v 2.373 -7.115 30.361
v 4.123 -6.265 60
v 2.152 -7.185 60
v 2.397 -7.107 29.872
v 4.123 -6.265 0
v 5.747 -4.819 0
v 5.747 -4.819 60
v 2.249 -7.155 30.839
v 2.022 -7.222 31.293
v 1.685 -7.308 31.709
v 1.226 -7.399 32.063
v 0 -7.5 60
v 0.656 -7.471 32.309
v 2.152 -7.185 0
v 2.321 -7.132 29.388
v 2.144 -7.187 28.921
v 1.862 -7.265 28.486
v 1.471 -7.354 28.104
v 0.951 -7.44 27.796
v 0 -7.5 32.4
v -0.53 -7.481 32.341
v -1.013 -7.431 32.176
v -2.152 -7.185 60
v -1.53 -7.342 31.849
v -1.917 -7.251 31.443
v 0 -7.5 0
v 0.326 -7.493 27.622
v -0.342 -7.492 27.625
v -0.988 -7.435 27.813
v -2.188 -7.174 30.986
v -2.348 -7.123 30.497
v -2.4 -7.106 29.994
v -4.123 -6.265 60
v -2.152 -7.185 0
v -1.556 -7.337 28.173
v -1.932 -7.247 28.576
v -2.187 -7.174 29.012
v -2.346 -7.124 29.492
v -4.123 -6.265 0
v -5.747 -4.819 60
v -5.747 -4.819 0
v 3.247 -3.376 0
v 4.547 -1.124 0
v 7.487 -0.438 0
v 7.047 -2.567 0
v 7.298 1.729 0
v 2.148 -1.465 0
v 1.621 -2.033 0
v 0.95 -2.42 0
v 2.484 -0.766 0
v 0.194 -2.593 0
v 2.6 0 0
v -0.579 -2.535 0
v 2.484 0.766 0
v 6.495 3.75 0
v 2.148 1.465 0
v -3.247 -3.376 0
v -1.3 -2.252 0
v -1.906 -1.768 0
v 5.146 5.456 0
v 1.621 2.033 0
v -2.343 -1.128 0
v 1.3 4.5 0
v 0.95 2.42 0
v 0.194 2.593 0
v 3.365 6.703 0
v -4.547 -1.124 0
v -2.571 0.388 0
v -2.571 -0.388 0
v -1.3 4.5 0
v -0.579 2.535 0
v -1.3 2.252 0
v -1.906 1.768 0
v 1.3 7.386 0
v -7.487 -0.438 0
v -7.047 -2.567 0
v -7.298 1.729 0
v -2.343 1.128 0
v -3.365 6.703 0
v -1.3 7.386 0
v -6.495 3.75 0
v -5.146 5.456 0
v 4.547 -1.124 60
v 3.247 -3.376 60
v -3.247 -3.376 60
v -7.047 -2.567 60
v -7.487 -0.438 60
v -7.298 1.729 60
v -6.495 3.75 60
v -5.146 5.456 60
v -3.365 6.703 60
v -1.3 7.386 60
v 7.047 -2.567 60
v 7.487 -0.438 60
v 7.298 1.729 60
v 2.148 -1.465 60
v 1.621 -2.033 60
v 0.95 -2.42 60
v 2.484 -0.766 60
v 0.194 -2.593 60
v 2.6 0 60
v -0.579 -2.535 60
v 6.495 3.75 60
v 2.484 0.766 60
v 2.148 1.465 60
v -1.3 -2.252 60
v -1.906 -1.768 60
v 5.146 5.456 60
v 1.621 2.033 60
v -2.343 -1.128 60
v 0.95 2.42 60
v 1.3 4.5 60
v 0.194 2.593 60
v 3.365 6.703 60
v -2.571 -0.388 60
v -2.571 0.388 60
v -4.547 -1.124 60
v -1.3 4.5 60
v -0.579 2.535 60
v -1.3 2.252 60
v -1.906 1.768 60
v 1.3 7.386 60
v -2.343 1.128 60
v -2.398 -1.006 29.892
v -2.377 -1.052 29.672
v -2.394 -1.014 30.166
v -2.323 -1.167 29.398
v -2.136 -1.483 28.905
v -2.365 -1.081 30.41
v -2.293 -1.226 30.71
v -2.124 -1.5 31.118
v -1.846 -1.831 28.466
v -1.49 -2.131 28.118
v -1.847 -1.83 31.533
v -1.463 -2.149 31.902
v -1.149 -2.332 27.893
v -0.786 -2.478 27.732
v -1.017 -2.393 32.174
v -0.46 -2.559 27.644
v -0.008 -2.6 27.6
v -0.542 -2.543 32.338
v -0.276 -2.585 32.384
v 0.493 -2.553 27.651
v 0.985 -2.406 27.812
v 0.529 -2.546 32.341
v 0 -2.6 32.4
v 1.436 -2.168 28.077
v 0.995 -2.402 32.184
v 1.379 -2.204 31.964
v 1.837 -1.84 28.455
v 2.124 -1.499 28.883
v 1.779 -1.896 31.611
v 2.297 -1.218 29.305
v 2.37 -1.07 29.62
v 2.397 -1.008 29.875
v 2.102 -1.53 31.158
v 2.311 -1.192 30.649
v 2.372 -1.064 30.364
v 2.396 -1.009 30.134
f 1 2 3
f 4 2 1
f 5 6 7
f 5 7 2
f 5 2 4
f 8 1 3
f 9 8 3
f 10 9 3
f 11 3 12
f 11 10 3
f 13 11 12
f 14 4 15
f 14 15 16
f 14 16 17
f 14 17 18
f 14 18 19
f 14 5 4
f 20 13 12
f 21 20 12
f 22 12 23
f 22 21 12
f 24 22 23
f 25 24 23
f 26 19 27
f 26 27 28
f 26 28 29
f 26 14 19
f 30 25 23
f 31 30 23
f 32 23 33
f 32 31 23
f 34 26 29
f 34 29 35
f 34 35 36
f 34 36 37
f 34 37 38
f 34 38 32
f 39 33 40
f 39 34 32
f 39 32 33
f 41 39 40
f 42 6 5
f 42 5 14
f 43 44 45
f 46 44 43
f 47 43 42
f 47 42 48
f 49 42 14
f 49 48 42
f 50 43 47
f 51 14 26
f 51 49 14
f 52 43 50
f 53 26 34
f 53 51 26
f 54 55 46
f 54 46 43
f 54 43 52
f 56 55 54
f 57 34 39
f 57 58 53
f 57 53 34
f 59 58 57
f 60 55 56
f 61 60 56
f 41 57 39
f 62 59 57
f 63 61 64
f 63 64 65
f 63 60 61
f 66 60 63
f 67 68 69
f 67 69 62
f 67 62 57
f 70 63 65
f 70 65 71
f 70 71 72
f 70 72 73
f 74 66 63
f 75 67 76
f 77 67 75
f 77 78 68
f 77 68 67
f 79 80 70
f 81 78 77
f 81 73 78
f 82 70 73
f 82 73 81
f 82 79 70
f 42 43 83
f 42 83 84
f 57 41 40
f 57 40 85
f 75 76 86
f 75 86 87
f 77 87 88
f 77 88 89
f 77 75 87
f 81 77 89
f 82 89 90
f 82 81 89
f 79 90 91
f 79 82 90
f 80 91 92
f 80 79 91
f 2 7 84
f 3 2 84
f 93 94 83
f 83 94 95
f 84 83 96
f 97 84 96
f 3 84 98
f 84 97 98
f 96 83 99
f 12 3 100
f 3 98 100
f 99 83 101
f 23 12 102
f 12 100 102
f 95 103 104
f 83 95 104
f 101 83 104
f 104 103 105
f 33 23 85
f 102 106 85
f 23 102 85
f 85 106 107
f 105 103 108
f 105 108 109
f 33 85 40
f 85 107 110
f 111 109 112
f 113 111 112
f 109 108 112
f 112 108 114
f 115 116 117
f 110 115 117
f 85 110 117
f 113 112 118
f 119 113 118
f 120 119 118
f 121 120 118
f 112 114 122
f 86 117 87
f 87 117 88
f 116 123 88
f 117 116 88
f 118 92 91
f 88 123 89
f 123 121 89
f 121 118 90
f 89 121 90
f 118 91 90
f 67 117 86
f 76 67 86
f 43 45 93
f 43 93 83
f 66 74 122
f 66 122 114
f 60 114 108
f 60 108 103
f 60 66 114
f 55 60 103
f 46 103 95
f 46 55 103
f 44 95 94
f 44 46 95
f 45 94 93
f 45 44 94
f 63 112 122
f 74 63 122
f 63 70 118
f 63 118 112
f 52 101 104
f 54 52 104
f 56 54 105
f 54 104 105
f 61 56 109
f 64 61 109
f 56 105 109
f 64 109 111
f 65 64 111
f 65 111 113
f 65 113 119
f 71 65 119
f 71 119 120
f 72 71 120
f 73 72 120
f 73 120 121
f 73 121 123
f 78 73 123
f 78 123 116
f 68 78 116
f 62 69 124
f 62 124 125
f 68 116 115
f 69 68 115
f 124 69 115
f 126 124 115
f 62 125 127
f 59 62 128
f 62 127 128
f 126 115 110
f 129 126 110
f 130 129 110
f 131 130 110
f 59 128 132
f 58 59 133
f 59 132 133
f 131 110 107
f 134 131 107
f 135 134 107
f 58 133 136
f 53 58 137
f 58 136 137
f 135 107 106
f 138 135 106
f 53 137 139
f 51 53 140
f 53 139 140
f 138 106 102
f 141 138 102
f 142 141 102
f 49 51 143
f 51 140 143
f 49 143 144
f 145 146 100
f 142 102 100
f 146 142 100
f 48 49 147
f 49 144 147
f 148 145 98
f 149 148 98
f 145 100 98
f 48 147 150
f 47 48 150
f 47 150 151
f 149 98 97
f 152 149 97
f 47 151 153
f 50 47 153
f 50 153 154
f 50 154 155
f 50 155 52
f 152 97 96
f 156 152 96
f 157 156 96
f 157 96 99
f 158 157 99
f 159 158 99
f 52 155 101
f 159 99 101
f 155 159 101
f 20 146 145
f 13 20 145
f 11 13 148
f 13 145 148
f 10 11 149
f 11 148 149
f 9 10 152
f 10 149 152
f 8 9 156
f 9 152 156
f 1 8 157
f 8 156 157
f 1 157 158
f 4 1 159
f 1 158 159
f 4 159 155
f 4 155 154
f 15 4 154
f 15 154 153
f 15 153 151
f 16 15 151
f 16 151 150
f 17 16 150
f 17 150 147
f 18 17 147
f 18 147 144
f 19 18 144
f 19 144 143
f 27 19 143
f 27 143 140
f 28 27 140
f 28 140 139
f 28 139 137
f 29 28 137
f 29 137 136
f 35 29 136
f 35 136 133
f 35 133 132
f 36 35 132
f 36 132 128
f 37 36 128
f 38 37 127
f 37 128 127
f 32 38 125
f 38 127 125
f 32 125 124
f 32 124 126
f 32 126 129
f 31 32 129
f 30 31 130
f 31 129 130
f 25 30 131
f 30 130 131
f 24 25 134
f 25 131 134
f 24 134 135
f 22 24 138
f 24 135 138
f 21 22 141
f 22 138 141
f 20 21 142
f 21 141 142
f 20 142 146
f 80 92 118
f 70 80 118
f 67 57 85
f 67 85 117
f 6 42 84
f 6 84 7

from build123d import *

# Parameters (mm, degrees)
ESTRUSIONE_ESTRUSIONE1_DEPTH = 60
SCHIZZO2_R                   = 2.6
TAGLIO_ESTRUSIONE1_DEPTH     = 60
SCHIZZO3_R                   = 2.4
TAGLIO_ESTRUSIONE2_DEPTH     = 10


with BuildPart() as part:
    # Schizzo1 → Estrusione-Estrusione1 (new body)
    with BuildSketch(Plane.XY):
        with BuildLine():
            Line((7.046874237, -2.567404038), (4.547114317, -1.124166975))
            Line((4.547114317, -1.124166975), (3.247114317, -3.375833025))
            Line((3.247114317, -3.375833025), (5.746874237, -4.819070087))
            ThreePointArc((5.746874237, -4.819070087), (0, -7.5), (-5.746874237, -4.819070087))
            Line((-5.746874237, -4.819070087), (-3.247114317, -3.375833025))
            Line((-3.247114317, -3.375833025), (-4.547114317, -1.124166975))
            Line((-4.547114317, -1.124166975), (-7.046874237, -2.567404038))
            ThreePointArc((-7.046874237, -2.567404038), (-6.495190528, 3.75), (-1.3, 7.386474125))
            Line((-1.3, 7.386474125), (-1.3, 4.5))
            Line((-1.3, 4.5), (1.3, 4.5))
            Line((1.3, 4.5), (1.3, 7.386474125))
            ThreePointArc((1.3, 7.386474125), (6.495190528, 3.75), (7.046874237, -2.567404038))
        make_face()
    extrude(amount=ESTRUSIONE_ESTRUSIONE1_DEPTH)

    # Schizzo2 → Taglio-Estrusione1 (cut)
    with BuildSketch(Plane.XY.offset(60)):
        Circle(SCHIZZO2_R)
    extrude(amount=-TAGLIO_ESTRUSIONE1_DEPTH, mode=Mode.SUBTRACT)

    # Schizzo3 → Taglio-Estrusione2 (cut)
    with BuildSketch(Plane(origin=(0, 0, 0), x_dir=(1, 0, 0), z_dir=(0, 1, 0))):
        with Locations(Location((0, -30, 0), (0, 0, 270))):
            Circle(SCHIZZO3_R)
    extrude(amount=-TAGLIO_ESTRUSIONE2_DEPTH, mode=Mode.SUBTRACT)


solid = part.part
